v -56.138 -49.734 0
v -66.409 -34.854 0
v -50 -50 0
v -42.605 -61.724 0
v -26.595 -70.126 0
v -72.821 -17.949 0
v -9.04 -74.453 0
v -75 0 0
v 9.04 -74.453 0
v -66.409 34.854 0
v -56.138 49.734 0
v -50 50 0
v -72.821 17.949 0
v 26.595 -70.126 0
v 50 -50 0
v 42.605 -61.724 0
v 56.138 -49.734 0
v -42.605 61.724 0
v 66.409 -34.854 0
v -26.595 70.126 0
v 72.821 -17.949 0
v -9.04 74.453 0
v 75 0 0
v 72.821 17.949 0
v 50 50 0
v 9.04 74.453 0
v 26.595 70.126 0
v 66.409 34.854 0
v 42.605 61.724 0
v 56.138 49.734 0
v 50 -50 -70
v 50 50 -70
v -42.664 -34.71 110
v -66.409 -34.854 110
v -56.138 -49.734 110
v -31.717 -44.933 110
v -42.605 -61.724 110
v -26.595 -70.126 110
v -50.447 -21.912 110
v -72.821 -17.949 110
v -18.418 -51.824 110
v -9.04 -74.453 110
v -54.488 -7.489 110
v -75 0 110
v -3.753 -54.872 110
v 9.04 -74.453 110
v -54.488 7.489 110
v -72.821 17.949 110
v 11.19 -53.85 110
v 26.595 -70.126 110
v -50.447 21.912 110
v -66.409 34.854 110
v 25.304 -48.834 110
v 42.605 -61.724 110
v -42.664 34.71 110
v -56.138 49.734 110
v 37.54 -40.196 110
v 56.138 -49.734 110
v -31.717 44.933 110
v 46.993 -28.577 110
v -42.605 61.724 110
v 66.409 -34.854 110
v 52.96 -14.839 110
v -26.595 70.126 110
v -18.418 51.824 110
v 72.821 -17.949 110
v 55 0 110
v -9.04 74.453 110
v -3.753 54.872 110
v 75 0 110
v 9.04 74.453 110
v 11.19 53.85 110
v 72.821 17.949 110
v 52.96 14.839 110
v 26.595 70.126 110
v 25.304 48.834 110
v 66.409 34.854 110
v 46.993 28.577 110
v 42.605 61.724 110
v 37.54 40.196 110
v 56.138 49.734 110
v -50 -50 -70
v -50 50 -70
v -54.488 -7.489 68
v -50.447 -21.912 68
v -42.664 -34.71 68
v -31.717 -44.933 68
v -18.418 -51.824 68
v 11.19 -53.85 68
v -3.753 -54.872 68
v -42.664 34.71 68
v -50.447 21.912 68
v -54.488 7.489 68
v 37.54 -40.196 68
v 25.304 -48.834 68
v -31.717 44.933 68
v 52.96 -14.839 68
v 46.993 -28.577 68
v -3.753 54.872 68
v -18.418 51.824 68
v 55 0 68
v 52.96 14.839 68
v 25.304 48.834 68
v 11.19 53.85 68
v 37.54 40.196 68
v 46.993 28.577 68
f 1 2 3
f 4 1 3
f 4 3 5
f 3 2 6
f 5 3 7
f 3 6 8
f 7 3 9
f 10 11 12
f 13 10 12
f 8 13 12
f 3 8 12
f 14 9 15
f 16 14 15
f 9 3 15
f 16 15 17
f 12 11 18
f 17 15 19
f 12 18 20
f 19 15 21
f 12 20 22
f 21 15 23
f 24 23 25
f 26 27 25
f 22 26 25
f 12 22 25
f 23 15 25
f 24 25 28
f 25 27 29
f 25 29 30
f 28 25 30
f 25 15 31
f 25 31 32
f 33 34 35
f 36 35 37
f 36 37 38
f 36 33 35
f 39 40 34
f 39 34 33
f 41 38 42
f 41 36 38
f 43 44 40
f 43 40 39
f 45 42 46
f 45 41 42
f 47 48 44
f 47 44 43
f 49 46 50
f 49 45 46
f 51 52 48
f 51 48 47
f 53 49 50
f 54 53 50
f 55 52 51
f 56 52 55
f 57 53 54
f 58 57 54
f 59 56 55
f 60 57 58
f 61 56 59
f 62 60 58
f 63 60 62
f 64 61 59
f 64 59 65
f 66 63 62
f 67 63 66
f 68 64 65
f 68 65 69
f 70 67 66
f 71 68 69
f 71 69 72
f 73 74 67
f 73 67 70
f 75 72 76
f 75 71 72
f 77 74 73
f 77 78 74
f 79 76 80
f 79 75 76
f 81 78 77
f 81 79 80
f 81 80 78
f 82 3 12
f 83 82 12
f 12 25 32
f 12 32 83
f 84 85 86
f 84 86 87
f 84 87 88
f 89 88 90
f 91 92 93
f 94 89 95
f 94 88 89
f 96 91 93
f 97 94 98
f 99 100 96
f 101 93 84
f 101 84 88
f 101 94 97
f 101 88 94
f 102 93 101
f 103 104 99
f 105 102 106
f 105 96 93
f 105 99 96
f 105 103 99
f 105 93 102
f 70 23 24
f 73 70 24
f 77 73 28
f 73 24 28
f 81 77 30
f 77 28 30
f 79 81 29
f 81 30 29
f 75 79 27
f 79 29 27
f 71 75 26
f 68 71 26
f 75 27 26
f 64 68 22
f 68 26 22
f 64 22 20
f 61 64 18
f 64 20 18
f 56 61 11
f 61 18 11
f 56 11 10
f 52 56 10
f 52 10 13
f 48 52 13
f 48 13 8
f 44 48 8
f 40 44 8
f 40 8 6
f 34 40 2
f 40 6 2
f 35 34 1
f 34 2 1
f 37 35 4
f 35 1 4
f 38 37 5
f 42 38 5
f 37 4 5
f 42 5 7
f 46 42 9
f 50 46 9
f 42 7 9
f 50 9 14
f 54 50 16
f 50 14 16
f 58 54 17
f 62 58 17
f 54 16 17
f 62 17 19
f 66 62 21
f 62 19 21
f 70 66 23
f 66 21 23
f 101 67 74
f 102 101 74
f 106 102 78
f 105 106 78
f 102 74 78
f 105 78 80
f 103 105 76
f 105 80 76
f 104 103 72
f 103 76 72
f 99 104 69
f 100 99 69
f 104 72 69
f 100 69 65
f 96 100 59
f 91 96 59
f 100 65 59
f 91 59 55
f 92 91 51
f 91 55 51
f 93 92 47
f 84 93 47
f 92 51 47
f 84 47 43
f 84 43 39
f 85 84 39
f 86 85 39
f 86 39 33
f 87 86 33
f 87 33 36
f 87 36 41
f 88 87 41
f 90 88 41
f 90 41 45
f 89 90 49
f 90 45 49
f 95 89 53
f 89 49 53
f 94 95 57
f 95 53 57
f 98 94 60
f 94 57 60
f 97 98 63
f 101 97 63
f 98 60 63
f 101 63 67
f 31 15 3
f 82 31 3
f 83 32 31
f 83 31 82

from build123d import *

# Parameters (mm, degrees)
SKETCH1_R           = 75
BOSS_EXTRUDE1_DEPTH = 110
SKETCH3_W           = 100
SKETCH3_H           = 100
BOSS_EXTRUDE2_DEPTH = 70
SKETCH4_R           = 55
CUT_EXTRUDE1_DEPTH  = 42


with BuildPart() as part:
    # Sketch1 → Boss-Extrude1 (new body)
    with BuildSketch(Plane.XY):
        Circle(SKETCH1_R)
    extrude(amount=BOSS_EXTRUDE1_DEPTH)

    # Sketch3 → Boss-Extrude2 (add)
    with BuildSketch(Plane(origin=(0, 0, 0), x_dir=(-1, 0, 0), z_dir=(0, 0, -1))):
        Rectangle(SKETCH3_W, SKETCH3_H)
    extrude(amount=BOSS_EXTRUDE2_DEPTH)

    # Sketch4 → Cut-Extrude1 (cut)
    with BuildSketch(Plane.XY.offset(110)):
        Circle(SKETCH4_R)
    extrude(amount=-CUT_EXTRUDE1_DEPTH, mode=Mode.SUBTRACT)


solid = part.part
